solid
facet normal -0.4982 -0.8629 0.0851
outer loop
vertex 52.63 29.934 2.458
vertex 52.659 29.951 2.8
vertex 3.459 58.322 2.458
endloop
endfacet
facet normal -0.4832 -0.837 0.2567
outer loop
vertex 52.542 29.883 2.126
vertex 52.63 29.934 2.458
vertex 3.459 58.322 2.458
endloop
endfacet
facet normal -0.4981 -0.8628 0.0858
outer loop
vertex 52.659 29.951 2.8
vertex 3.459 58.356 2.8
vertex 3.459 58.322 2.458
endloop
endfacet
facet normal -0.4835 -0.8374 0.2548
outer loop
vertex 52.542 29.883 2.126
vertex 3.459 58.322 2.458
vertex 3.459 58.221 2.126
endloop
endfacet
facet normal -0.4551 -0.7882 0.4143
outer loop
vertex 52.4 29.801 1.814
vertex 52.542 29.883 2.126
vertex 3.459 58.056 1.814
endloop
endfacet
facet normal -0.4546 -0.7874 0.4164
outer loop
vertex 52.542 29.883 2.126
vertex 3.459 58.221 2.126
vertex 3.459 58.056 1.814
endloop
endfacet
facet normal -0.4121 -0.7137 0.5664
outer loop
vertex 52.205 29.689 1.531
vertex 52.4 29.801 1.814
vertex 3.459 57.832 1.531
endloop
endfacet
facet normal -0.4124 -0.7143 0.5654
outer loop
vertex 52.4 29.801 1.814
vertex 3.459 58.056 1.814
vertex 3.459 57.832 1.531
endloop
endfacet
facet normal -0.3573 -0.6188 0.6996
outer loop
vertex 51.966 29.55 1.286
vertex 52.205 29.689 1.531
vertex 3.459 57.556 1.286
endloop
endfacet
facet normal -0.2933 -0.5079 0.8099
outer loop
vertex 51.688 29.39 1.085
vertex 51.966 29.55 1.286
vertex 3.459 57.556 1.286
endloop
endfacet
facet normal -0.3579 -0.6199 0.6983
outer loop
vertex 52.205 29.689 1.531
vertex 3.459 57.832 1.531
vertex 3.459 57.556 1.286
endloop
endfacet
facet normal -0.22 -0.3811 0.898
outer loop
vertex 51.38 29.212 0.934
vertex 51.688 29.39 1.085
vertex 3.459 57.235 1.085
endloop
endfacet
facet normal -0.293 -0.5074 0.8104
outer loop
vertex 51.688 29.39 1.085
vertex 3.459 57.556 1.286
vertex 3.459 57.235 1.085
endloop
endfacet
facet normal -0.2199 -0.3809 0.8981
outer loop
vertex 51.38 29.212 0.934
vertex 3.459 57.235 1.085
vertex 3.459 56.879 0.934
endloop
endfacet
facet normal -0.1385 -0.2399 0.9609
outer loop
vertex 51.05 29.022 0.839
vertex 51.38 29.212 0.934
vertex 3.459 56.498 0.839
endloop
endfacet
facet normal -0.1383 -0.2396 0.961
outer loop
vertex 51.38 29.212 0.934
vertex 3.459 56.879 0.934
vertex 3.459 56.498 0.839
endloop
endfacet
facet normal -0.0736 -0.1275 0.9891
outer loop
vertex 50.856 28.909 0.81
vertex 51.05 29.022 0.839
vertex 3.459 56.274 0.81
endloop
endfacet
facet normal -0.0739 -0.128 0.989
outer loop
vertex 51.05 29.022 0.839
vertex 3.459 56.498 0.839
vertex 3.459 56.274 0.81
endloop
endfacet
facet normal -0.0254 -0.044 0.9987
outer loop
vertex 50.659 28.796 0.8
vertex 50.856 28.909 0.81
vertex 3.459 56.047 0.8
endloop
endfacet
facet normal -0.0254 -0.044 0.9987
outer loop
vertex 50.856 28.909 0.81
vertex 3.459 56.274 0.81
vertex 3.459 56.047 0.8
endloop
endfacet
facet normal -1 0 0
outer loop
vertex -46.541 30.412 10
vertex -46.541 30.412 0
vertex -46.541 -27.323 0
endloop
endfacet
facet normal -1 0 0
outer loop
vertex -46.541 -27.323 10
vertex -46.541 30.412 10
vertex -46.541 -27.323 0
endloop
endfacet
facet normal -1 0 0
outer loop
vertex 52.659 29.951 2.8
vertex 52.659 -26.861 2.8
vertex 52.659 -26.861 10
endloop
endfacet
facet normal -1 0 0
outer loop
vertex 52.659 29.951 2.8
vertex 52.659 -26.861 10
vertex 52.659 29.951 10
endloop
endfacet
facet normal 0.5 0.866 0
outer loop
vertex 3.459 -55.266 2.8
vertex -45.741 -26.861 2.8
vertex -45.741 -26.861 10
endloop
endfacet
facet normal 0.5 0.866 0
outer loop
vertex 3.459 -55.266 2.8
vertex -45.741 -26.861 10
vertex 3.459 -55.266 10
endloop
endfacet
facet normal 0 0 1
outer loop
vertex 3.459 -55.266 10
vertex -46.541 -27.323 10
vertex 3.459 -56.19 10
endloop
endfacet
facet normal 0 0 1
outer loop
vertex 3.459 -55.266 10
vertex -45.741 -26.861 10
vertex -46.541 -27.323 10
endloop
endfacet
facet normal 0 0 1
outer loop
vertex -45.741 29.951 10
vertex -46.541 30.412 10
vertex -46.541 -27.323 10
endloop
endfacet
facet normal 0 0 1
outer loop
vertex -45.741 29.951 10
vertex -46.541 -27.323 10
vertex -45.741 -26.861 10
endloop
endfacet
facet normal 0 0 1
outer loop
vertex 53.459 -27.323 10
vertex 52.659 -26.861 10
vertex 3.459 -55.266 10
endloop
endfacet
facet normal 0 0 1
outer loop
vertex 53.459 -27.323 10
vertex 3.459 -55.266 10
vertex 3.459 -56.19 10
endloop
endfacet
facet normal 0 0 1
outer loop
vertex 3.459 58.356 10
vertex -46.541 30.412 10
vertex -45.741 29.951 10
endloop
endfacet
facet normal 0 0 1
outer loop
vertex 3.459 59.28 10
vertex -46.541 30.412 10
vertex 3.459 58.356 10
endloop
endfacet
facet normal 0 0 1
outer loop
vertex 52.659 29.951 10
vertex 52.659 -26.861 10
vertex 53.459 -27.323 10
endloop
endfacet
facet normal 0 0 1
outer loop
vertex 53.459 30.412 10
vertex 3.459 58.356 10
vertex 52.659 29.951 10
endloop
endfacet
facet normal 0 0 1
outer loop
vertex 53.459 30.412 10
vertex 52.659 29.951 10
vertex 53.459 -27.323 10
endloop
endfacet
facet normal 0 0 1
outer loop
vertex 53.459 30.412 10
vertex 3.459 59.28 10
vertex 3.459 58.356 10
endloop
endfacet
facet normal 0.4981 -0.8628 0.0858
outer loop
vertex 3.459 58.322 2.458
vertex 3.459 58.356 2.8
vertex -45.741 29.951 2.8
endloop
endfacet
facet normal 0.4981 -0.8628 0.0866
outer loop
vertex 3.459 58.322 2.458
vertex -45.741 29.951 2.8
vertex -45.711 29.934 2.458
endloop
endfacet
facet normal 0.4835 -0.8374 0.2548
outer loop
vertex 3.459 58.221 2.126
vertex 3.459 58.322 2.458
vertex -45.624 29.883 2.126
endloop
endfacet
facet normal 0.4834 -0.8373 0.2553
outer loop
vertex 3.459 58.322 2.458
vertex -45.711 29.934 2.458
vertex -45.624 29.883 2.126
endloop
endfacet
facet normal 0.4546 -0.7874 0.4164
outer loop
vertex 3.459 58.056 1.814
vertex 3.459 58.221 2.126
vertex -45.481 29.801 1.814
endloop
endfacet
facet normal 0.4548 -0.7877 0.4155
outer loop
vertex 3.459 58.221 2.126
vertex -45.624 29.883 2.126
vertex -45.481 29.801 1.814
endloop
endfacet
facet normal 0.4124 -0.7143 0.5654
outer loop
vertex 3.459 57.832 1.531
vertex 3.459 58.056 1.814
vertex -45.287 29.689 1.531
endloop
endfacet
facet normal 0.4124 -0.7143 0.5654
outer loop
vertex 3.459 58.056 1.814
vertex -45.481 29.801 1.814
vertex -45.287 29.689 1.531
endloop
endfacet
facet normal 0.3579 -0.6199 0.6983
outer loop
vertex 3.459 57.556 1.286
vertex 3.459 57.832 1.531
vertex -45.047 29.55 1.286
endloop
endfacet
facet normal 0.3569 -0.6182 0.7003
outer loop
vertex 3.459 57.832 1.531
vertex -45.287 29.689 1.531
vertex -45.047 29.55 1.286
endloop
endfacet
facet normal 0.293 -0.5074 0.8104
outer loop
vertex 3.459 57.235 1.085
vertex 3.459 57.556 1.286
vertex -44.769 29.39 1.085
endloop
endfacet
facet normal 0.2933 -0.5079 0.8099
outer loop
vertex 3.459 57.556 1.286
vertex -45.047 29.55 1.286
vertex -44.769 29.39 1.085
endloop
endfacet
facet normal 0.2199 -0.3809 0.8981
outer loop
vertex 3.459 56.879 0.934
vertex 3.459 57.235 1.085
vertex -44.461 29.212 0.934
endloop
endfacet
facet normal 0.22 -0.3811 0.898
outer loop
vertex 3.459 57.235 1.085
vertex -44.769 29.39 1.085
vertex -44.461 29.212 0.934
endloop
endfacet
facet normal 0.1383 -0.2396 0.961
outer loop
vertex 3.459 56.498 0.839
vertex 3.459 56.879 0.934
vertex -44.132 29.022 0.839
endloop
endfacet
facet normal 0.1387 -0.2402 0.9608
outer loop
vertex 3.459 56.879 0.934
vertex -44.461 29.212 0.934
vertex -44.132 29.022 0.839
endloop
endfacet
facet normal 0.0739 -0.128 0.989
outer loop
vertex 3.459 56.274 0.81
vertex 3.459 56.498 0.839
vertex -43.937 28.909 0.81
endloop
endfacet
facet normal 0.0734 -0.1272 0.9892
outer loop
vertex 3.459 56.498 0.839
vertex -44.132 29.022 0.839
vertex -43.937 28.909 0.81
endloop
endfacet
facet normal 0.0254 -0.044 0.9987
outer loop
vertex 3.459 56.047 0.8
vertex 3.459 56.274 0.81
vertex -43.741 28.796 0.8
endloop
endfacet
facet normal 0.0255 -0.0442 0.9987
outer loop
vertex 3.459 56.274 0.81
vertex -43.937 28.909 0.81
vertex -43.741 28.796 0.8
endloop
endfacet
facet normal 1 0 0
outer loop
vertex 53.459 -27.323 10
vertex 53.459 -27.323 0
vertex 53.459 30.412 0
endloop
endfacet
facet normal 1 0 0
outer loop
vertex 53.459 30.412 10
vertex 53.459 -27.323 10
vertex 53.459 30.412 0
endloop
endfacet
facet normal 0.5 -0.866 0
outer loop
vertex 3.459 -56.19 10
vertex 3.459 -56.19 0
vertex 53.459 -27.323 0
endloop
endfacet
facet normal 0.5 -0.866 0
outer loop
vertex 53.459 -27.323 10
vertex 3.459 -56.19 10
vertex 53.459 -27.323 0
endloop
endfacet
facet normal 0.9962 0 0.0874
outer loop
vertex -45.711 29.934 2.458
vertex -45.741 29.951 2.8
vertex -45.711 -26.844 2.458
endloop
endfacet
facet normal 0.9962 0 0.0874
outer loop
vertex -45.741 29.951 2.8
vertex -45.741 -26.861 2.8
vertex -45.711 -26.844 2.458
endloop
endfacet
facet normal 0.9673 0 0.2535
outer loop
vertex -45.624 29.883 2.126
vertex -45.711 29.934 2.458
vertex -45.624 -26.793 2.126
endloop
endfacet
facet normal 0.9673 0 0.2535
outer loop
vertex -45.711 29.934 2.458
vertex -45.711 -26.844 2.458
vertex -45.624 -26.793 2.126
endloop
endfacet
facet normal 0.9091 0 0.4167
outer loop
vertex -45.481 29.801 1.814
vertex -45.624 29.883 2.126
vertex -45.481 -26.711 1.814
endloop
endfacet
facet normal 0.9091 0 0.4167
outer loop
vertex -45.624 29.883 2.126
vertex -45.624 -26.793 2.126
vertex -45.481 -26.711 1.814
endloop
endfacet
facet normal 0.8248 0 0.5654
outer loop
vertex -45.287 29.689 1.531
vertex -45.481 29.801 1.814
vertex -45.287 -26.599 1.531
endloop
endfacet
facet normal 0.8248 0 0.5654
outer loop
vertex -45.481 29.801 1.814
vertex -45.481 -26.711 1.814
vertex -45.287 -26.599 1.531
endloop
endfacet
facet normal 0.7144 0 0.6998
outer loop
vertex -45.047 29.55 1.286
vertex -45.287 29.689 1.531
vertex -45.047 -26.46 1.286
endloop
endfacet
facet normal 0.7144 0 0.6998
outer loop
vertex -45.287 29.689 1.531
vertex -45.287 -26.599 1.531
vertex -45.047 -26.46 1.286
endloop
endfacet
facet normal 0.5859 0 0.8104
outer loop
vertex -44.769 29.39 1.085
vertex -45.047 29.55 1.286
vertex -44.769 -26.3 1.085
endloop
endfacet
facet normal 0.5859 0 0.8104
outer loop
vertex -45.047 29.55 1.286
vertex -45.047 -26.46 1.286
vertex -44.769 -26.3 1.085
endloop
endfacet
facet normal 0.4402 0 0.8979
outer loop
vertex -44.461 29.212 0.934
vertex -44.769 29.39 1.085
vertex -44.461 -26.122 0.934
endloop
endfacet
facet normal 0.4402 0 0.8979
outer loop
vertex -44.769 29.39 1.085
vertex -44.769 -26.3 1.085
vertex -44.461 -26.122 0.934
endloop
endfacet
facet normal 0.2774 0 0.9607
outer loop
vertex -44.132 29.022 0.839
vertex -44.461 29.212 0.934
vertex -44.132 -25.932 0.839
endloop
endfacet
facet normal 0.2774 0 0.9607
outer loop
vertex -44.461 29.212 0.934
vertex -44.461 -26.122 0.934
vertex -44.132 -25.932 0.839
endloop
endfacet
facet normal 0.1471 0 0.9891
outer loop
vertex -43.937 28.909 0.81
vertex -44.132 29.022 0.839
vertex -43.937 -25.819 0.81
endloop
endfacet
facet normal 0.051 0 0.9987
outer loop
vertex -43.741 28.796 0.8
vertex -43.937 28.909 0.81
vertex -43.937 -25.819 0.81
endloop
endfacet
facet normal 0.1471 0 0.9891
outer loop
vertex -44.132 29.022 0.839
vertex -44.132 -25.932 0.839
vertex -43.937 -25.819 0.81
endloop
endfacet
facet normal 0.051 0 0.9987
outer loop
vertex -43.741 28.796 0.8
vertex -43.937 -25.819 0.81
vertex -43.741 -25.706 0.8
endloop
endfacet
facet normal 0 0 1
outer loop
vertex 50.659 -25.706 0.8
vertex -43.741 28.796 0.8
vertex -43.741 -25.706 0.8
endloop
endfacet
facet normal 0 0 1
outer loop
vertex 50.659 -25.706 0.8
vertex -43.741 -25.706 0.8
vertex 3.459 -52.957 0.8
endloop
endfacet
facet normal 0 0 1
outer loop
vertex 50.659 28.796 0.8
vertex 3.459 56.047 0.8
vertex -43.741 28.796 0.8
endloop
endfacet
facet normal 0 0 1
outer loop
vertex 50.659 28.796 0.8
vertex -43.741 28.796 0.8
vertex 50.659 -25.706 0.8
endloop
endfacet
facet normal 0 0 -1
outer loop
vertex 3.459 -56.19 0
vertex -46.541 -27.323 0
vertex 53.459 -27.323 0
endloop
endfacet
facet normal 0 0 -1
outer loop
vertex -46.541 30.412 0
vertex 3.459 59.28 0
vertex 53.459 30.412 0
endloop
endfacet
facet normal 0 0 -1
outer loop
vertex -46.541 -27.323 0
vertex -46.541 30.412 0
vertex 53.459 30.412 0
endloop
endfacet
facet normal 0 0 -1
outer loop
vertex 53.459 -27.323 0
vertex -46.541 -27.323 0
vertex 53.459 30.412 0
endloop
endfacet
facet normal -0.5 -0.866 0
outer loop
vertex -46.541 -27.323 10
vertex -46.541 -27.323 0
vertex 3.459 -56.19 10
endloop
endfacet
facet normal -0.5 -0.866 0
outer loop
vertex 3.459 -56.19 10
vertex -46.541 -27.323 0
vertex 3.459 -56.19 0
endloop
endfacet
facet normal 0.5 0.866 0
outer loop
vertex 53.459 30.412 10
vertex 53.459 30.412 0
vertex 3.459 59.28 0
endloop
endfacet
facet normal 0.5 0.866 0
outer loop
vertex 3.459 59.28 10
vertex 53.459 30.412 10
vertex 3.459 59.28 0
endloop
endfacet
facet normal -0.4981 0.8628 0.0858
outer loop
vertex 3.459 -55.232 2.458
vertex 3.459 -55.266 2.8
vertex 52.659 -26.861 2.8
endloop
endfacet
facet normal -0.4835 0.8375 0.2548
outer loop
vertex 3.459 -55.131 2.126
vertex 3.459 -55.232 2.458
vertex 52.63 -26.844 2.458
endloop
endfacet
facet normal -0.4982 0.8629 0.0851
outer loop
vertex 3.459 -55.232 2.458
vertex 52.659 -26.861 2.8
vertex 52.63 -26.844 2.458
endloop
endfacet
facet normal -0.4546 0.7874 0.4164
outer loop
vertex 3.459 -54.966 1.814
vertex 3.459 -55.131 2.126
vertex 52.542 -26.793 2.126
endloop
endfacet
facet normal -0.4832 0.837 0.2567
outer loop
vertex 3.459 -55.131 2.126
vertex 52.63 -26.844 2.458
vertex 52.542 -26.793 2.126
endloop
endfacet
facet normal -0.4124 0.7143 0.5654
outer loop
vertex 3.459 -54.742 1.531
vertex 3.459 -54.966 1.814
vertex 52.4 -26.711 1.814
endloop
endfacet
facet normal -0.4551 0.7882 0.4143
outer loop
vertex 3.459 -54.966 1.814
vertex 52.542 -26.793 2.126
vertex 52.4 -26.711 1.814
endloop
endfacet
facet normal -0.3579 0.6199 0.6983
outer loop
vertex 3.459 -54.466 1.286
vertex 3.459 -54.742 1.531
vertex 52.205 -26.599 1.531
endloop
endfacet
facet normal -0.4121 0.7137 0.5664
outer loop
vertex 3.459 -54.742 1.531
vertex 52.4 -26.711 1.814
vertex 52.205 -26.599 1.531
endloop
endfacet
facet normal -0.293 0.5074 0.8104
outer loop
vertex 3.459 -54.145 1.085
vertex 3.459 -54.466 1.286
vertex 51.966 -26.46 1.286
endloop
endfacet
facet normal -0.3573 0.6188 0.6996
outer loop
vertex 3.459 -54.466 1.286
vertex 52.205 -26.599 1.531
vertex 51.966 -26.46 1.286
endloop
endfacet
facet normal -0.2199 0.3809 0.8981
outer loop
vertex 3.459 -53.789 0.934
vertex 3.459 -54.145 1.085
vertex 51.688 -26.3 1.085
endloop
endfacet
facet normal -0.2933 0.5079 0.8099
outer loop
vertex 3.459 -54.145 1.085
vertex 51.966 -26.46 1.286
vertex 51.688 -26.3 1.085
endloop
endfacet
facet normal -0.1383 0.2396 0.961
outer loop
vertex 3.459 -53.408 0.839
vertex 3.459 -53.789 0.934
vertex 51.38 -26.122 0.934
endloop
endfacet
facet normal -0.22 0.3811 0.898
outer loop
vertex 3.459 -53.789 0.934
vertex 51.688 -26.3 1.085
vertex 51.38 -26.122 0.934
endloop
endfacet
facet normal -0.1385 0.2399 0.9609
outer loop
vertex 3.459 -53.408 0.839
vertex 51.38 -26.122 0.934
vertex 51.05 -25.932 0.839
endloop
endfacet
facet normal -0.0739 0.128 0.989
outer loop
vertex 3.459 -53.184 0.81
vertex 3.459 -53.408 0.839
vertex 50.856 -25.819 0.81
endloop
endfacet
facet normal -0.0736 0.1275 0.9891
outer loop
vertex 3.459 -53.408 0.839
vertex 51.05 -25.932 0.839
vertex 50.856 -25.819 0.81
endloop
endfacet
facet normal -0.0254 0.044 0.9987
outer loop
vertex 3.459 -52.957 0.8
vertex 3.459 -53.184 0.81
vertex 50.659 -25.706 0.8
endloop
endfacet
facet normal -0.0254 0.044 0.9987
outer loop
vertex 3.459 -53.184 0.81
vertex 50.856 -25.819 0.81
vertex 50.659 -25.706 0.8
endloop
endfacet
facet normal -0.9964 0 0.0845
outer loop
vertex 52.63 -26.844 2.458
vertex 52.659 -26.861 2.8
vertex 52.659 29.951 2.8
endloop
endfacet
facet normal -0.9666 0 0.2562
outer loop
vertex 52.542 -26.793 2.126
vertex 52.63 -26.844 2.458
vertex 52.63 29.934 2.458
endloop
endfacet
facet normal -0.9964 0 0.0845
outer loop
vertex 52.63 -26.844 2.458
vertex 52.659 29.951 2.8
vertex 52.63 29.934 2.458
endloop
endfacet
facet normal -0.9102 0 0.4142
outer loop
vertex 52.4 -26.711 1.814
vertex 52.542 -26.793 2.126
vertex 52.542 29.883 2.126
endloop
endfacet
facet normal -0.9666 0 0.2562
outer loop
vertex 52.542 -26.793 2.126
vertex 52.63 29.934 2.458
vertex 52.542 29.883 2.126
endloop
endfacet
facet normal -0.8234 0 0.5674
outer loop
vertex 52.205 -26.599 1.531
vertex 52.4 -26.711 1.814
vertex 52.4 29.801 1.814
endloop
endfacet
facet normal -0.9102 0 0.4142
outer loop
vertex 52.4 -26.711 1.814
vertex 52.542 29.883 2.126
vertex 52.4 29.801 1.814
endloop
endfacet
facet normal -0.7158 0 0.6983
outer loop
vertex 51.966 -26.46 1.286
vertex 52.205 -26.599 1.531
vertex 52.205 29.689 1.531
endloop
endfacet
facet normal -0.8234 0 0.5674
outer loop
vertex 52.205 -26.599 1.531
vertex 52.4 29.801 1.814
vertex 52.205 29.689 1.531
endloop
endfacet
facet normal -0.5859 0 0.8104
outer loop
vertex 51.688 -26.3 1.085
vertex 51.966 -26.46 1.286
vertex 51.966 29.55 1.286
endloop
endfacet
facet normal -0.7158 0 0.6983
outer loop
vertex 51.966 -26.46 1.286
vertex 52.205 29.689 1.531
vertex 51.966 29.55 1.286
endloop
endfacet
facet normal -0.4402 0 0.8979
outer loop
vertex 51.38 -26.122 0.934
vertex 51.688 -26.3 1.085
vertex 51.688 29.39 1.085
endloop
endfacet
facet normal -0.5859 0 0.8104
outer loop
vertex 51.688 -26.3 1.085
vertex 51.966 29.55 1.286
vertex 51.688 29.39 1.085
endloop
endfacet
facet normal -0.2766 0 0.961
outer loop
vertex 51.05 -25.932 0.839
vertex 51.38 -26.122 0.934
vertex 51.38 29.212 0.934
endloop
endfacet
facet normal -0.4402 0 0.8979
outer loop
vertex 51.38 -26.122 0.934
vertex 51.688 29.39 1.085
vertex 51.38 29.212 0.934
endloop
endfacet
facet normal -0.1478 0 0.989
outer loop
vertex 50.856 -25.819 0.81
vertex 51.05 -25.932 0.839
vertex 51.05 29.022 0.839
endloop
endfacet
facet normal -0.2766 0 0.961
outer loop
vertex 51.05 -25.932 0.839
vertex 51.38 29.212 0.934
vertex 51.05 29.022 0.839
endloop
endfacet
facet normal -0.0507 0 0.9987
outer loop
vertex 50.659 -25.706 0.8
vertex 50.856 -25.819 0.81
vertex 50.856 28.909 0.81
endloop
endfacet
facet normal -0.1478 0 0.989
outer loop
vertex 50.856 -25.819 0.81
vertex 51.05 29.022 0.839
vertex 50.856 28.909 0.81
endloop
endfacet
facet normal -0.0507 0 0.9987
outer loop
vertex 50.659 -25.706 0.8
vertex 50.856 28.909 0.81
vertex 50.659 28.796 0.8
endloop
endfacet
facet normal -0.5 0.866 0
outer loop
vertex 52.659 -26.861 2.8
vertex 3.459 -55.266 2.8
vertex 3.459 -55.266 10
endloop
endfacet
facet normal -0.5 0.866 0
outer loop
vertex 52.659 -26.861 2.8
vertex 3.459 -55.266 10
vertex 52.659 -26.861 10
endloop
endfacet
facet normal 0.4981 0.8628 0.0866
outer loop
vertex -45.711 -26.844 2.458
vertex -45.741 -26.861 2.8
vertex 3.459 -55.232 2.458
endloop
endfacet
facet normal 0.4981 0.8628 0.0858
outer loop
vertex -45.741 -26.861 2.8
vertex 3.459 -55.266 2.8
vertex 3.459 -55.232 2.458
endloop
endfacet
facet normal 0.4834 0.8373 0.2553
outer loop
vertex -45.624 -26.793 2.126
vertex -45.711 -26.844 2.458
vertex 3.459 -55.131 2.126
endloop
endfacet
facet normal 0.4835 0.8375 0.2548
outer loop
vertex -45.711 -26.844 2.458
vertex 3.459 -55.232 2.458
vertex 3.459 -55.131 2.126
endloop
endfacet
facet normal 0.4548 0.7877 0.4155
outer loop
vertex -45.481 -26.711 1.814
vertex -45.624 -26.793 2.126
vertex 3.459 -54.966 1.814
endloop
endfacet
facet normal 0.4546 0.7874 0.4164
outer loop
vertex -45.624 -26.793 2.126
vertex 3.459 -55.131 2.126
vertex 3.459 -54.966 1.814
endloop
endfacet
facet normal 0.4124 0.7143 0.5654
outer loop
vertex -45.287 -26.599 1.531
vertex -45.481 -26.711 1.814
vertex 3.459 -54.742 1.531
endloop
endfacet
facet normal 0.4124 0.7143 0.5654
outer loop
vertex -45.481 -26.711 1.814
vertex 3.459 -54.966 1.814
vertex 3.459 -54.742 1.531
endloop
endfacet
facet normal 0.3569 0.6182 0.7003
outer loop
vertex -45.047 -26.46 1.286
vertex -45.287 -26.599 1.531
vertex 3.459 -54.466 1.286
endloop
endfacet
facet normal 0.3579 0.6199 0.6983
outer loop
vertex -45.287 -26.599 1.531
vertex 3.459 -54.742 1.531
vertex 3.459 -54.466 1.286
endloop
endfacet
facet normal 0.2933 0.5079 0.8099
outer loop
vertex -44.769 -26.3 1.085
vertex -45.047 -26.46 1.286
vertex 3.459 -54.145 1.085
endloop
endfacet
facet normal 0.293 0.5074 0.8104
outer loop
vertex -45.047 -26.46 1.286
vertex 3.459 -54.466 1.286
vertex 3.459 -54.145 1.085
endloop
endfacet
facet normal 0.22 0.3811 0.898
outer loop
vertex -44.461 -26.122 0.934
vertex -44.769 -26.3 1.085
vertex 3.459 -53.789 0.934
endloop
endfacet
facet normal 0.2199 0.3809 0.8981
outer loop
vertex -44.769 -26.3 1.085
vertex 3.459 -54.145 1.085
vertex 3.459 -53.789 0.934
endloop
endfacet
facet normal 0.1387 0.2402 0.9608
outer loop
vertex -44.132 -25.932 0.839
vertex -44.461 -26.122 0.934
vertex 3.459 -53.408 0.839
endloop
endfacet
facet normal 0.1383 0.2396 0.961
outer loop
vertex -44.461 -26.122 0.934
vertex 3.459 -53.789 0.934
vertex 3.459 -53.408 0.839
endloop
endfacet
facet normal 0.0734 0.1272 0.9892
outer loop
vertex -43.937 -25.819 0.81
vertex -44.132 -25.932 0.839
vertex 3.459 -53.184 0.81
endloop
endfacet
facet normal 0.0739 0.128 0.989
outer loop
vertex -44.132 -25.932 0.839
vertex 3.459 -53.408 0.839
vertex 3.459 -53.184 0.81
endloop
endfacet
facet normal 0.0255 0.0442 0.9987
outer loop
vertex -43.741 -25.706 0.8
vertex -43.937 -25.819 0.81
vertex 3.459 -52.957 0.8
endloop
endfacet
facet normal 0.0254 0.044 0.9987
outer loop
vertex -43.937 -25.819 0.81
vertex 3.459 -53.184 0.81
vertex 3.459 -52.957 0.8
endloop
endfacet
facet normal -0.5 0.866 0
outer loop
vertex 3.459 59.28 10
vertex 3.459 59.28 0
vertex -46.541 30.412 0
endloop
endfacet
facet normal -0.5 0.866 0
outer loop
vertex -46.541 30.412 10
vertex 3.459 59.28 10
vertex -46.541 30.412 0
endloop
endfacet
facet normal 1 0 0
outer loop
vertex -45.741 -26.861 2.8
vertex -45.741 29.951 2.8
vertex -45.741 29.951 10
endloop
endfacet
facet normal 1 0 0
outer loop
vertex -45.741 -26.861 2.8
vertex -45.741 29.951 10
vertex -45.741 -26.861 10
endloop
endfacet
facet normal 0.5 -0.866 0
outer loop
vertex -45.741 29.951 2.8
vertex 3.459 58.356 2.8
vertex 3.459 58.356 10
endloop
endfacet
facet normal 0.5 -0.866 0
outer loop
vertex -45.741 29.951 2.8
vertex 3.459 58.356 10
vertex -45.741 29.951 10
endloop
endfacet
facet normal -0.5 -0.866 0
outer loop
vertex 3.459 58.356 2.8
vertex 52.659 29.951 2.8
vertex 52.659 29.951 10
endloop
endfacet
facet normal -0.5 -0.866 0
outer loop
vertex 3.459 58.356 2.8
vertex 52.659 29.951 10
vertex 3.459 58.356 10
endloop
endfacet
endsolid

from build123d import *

# Parameters (mm, degrees)
F1_DEPTH = 10
F2_T     = -0.8
F3_R     = 2


with BuildPart() as f1:
    # F0 (on Top) → F1 (new body)
    with BuildSketch(Plane.XY):
        Polygon((53.4592177784, 30.4124803951), (3.4592177784, 59.2799938546), (-46.5407822216, 30.4124803951), (-46.5407822216, -27.3225465238), (3.4592177784, -56.1900599833), (53.4592177784, -27.3225465238), align=None)
    extrude(amount=F1_DEPTH)

    # F2
    f2_openings = [f1.faces().sort_by_distance(p)[0] for p in [
        (3.459218, 1.544967, 10),
    ]]
    offset(amount=F2_T, openings=f2_openings)

    # F3
    f3_edges = [f1.edges().sort_by_distance(p)[0] for p in [
        (28.059218, -41.063483, 0.8),
        (52.659218, 1.544967, 0.8),
        (28.059218, 44.153417, 0.8),
        (-21.140782, 44.153417, 0.8),
        (-45.740782, 1.544967, 0.8),
        (-21.140782, -41.063483, 0.8),
    ]]
    fillet(f3_edges, radius=F3_R)


solid = f1.part
